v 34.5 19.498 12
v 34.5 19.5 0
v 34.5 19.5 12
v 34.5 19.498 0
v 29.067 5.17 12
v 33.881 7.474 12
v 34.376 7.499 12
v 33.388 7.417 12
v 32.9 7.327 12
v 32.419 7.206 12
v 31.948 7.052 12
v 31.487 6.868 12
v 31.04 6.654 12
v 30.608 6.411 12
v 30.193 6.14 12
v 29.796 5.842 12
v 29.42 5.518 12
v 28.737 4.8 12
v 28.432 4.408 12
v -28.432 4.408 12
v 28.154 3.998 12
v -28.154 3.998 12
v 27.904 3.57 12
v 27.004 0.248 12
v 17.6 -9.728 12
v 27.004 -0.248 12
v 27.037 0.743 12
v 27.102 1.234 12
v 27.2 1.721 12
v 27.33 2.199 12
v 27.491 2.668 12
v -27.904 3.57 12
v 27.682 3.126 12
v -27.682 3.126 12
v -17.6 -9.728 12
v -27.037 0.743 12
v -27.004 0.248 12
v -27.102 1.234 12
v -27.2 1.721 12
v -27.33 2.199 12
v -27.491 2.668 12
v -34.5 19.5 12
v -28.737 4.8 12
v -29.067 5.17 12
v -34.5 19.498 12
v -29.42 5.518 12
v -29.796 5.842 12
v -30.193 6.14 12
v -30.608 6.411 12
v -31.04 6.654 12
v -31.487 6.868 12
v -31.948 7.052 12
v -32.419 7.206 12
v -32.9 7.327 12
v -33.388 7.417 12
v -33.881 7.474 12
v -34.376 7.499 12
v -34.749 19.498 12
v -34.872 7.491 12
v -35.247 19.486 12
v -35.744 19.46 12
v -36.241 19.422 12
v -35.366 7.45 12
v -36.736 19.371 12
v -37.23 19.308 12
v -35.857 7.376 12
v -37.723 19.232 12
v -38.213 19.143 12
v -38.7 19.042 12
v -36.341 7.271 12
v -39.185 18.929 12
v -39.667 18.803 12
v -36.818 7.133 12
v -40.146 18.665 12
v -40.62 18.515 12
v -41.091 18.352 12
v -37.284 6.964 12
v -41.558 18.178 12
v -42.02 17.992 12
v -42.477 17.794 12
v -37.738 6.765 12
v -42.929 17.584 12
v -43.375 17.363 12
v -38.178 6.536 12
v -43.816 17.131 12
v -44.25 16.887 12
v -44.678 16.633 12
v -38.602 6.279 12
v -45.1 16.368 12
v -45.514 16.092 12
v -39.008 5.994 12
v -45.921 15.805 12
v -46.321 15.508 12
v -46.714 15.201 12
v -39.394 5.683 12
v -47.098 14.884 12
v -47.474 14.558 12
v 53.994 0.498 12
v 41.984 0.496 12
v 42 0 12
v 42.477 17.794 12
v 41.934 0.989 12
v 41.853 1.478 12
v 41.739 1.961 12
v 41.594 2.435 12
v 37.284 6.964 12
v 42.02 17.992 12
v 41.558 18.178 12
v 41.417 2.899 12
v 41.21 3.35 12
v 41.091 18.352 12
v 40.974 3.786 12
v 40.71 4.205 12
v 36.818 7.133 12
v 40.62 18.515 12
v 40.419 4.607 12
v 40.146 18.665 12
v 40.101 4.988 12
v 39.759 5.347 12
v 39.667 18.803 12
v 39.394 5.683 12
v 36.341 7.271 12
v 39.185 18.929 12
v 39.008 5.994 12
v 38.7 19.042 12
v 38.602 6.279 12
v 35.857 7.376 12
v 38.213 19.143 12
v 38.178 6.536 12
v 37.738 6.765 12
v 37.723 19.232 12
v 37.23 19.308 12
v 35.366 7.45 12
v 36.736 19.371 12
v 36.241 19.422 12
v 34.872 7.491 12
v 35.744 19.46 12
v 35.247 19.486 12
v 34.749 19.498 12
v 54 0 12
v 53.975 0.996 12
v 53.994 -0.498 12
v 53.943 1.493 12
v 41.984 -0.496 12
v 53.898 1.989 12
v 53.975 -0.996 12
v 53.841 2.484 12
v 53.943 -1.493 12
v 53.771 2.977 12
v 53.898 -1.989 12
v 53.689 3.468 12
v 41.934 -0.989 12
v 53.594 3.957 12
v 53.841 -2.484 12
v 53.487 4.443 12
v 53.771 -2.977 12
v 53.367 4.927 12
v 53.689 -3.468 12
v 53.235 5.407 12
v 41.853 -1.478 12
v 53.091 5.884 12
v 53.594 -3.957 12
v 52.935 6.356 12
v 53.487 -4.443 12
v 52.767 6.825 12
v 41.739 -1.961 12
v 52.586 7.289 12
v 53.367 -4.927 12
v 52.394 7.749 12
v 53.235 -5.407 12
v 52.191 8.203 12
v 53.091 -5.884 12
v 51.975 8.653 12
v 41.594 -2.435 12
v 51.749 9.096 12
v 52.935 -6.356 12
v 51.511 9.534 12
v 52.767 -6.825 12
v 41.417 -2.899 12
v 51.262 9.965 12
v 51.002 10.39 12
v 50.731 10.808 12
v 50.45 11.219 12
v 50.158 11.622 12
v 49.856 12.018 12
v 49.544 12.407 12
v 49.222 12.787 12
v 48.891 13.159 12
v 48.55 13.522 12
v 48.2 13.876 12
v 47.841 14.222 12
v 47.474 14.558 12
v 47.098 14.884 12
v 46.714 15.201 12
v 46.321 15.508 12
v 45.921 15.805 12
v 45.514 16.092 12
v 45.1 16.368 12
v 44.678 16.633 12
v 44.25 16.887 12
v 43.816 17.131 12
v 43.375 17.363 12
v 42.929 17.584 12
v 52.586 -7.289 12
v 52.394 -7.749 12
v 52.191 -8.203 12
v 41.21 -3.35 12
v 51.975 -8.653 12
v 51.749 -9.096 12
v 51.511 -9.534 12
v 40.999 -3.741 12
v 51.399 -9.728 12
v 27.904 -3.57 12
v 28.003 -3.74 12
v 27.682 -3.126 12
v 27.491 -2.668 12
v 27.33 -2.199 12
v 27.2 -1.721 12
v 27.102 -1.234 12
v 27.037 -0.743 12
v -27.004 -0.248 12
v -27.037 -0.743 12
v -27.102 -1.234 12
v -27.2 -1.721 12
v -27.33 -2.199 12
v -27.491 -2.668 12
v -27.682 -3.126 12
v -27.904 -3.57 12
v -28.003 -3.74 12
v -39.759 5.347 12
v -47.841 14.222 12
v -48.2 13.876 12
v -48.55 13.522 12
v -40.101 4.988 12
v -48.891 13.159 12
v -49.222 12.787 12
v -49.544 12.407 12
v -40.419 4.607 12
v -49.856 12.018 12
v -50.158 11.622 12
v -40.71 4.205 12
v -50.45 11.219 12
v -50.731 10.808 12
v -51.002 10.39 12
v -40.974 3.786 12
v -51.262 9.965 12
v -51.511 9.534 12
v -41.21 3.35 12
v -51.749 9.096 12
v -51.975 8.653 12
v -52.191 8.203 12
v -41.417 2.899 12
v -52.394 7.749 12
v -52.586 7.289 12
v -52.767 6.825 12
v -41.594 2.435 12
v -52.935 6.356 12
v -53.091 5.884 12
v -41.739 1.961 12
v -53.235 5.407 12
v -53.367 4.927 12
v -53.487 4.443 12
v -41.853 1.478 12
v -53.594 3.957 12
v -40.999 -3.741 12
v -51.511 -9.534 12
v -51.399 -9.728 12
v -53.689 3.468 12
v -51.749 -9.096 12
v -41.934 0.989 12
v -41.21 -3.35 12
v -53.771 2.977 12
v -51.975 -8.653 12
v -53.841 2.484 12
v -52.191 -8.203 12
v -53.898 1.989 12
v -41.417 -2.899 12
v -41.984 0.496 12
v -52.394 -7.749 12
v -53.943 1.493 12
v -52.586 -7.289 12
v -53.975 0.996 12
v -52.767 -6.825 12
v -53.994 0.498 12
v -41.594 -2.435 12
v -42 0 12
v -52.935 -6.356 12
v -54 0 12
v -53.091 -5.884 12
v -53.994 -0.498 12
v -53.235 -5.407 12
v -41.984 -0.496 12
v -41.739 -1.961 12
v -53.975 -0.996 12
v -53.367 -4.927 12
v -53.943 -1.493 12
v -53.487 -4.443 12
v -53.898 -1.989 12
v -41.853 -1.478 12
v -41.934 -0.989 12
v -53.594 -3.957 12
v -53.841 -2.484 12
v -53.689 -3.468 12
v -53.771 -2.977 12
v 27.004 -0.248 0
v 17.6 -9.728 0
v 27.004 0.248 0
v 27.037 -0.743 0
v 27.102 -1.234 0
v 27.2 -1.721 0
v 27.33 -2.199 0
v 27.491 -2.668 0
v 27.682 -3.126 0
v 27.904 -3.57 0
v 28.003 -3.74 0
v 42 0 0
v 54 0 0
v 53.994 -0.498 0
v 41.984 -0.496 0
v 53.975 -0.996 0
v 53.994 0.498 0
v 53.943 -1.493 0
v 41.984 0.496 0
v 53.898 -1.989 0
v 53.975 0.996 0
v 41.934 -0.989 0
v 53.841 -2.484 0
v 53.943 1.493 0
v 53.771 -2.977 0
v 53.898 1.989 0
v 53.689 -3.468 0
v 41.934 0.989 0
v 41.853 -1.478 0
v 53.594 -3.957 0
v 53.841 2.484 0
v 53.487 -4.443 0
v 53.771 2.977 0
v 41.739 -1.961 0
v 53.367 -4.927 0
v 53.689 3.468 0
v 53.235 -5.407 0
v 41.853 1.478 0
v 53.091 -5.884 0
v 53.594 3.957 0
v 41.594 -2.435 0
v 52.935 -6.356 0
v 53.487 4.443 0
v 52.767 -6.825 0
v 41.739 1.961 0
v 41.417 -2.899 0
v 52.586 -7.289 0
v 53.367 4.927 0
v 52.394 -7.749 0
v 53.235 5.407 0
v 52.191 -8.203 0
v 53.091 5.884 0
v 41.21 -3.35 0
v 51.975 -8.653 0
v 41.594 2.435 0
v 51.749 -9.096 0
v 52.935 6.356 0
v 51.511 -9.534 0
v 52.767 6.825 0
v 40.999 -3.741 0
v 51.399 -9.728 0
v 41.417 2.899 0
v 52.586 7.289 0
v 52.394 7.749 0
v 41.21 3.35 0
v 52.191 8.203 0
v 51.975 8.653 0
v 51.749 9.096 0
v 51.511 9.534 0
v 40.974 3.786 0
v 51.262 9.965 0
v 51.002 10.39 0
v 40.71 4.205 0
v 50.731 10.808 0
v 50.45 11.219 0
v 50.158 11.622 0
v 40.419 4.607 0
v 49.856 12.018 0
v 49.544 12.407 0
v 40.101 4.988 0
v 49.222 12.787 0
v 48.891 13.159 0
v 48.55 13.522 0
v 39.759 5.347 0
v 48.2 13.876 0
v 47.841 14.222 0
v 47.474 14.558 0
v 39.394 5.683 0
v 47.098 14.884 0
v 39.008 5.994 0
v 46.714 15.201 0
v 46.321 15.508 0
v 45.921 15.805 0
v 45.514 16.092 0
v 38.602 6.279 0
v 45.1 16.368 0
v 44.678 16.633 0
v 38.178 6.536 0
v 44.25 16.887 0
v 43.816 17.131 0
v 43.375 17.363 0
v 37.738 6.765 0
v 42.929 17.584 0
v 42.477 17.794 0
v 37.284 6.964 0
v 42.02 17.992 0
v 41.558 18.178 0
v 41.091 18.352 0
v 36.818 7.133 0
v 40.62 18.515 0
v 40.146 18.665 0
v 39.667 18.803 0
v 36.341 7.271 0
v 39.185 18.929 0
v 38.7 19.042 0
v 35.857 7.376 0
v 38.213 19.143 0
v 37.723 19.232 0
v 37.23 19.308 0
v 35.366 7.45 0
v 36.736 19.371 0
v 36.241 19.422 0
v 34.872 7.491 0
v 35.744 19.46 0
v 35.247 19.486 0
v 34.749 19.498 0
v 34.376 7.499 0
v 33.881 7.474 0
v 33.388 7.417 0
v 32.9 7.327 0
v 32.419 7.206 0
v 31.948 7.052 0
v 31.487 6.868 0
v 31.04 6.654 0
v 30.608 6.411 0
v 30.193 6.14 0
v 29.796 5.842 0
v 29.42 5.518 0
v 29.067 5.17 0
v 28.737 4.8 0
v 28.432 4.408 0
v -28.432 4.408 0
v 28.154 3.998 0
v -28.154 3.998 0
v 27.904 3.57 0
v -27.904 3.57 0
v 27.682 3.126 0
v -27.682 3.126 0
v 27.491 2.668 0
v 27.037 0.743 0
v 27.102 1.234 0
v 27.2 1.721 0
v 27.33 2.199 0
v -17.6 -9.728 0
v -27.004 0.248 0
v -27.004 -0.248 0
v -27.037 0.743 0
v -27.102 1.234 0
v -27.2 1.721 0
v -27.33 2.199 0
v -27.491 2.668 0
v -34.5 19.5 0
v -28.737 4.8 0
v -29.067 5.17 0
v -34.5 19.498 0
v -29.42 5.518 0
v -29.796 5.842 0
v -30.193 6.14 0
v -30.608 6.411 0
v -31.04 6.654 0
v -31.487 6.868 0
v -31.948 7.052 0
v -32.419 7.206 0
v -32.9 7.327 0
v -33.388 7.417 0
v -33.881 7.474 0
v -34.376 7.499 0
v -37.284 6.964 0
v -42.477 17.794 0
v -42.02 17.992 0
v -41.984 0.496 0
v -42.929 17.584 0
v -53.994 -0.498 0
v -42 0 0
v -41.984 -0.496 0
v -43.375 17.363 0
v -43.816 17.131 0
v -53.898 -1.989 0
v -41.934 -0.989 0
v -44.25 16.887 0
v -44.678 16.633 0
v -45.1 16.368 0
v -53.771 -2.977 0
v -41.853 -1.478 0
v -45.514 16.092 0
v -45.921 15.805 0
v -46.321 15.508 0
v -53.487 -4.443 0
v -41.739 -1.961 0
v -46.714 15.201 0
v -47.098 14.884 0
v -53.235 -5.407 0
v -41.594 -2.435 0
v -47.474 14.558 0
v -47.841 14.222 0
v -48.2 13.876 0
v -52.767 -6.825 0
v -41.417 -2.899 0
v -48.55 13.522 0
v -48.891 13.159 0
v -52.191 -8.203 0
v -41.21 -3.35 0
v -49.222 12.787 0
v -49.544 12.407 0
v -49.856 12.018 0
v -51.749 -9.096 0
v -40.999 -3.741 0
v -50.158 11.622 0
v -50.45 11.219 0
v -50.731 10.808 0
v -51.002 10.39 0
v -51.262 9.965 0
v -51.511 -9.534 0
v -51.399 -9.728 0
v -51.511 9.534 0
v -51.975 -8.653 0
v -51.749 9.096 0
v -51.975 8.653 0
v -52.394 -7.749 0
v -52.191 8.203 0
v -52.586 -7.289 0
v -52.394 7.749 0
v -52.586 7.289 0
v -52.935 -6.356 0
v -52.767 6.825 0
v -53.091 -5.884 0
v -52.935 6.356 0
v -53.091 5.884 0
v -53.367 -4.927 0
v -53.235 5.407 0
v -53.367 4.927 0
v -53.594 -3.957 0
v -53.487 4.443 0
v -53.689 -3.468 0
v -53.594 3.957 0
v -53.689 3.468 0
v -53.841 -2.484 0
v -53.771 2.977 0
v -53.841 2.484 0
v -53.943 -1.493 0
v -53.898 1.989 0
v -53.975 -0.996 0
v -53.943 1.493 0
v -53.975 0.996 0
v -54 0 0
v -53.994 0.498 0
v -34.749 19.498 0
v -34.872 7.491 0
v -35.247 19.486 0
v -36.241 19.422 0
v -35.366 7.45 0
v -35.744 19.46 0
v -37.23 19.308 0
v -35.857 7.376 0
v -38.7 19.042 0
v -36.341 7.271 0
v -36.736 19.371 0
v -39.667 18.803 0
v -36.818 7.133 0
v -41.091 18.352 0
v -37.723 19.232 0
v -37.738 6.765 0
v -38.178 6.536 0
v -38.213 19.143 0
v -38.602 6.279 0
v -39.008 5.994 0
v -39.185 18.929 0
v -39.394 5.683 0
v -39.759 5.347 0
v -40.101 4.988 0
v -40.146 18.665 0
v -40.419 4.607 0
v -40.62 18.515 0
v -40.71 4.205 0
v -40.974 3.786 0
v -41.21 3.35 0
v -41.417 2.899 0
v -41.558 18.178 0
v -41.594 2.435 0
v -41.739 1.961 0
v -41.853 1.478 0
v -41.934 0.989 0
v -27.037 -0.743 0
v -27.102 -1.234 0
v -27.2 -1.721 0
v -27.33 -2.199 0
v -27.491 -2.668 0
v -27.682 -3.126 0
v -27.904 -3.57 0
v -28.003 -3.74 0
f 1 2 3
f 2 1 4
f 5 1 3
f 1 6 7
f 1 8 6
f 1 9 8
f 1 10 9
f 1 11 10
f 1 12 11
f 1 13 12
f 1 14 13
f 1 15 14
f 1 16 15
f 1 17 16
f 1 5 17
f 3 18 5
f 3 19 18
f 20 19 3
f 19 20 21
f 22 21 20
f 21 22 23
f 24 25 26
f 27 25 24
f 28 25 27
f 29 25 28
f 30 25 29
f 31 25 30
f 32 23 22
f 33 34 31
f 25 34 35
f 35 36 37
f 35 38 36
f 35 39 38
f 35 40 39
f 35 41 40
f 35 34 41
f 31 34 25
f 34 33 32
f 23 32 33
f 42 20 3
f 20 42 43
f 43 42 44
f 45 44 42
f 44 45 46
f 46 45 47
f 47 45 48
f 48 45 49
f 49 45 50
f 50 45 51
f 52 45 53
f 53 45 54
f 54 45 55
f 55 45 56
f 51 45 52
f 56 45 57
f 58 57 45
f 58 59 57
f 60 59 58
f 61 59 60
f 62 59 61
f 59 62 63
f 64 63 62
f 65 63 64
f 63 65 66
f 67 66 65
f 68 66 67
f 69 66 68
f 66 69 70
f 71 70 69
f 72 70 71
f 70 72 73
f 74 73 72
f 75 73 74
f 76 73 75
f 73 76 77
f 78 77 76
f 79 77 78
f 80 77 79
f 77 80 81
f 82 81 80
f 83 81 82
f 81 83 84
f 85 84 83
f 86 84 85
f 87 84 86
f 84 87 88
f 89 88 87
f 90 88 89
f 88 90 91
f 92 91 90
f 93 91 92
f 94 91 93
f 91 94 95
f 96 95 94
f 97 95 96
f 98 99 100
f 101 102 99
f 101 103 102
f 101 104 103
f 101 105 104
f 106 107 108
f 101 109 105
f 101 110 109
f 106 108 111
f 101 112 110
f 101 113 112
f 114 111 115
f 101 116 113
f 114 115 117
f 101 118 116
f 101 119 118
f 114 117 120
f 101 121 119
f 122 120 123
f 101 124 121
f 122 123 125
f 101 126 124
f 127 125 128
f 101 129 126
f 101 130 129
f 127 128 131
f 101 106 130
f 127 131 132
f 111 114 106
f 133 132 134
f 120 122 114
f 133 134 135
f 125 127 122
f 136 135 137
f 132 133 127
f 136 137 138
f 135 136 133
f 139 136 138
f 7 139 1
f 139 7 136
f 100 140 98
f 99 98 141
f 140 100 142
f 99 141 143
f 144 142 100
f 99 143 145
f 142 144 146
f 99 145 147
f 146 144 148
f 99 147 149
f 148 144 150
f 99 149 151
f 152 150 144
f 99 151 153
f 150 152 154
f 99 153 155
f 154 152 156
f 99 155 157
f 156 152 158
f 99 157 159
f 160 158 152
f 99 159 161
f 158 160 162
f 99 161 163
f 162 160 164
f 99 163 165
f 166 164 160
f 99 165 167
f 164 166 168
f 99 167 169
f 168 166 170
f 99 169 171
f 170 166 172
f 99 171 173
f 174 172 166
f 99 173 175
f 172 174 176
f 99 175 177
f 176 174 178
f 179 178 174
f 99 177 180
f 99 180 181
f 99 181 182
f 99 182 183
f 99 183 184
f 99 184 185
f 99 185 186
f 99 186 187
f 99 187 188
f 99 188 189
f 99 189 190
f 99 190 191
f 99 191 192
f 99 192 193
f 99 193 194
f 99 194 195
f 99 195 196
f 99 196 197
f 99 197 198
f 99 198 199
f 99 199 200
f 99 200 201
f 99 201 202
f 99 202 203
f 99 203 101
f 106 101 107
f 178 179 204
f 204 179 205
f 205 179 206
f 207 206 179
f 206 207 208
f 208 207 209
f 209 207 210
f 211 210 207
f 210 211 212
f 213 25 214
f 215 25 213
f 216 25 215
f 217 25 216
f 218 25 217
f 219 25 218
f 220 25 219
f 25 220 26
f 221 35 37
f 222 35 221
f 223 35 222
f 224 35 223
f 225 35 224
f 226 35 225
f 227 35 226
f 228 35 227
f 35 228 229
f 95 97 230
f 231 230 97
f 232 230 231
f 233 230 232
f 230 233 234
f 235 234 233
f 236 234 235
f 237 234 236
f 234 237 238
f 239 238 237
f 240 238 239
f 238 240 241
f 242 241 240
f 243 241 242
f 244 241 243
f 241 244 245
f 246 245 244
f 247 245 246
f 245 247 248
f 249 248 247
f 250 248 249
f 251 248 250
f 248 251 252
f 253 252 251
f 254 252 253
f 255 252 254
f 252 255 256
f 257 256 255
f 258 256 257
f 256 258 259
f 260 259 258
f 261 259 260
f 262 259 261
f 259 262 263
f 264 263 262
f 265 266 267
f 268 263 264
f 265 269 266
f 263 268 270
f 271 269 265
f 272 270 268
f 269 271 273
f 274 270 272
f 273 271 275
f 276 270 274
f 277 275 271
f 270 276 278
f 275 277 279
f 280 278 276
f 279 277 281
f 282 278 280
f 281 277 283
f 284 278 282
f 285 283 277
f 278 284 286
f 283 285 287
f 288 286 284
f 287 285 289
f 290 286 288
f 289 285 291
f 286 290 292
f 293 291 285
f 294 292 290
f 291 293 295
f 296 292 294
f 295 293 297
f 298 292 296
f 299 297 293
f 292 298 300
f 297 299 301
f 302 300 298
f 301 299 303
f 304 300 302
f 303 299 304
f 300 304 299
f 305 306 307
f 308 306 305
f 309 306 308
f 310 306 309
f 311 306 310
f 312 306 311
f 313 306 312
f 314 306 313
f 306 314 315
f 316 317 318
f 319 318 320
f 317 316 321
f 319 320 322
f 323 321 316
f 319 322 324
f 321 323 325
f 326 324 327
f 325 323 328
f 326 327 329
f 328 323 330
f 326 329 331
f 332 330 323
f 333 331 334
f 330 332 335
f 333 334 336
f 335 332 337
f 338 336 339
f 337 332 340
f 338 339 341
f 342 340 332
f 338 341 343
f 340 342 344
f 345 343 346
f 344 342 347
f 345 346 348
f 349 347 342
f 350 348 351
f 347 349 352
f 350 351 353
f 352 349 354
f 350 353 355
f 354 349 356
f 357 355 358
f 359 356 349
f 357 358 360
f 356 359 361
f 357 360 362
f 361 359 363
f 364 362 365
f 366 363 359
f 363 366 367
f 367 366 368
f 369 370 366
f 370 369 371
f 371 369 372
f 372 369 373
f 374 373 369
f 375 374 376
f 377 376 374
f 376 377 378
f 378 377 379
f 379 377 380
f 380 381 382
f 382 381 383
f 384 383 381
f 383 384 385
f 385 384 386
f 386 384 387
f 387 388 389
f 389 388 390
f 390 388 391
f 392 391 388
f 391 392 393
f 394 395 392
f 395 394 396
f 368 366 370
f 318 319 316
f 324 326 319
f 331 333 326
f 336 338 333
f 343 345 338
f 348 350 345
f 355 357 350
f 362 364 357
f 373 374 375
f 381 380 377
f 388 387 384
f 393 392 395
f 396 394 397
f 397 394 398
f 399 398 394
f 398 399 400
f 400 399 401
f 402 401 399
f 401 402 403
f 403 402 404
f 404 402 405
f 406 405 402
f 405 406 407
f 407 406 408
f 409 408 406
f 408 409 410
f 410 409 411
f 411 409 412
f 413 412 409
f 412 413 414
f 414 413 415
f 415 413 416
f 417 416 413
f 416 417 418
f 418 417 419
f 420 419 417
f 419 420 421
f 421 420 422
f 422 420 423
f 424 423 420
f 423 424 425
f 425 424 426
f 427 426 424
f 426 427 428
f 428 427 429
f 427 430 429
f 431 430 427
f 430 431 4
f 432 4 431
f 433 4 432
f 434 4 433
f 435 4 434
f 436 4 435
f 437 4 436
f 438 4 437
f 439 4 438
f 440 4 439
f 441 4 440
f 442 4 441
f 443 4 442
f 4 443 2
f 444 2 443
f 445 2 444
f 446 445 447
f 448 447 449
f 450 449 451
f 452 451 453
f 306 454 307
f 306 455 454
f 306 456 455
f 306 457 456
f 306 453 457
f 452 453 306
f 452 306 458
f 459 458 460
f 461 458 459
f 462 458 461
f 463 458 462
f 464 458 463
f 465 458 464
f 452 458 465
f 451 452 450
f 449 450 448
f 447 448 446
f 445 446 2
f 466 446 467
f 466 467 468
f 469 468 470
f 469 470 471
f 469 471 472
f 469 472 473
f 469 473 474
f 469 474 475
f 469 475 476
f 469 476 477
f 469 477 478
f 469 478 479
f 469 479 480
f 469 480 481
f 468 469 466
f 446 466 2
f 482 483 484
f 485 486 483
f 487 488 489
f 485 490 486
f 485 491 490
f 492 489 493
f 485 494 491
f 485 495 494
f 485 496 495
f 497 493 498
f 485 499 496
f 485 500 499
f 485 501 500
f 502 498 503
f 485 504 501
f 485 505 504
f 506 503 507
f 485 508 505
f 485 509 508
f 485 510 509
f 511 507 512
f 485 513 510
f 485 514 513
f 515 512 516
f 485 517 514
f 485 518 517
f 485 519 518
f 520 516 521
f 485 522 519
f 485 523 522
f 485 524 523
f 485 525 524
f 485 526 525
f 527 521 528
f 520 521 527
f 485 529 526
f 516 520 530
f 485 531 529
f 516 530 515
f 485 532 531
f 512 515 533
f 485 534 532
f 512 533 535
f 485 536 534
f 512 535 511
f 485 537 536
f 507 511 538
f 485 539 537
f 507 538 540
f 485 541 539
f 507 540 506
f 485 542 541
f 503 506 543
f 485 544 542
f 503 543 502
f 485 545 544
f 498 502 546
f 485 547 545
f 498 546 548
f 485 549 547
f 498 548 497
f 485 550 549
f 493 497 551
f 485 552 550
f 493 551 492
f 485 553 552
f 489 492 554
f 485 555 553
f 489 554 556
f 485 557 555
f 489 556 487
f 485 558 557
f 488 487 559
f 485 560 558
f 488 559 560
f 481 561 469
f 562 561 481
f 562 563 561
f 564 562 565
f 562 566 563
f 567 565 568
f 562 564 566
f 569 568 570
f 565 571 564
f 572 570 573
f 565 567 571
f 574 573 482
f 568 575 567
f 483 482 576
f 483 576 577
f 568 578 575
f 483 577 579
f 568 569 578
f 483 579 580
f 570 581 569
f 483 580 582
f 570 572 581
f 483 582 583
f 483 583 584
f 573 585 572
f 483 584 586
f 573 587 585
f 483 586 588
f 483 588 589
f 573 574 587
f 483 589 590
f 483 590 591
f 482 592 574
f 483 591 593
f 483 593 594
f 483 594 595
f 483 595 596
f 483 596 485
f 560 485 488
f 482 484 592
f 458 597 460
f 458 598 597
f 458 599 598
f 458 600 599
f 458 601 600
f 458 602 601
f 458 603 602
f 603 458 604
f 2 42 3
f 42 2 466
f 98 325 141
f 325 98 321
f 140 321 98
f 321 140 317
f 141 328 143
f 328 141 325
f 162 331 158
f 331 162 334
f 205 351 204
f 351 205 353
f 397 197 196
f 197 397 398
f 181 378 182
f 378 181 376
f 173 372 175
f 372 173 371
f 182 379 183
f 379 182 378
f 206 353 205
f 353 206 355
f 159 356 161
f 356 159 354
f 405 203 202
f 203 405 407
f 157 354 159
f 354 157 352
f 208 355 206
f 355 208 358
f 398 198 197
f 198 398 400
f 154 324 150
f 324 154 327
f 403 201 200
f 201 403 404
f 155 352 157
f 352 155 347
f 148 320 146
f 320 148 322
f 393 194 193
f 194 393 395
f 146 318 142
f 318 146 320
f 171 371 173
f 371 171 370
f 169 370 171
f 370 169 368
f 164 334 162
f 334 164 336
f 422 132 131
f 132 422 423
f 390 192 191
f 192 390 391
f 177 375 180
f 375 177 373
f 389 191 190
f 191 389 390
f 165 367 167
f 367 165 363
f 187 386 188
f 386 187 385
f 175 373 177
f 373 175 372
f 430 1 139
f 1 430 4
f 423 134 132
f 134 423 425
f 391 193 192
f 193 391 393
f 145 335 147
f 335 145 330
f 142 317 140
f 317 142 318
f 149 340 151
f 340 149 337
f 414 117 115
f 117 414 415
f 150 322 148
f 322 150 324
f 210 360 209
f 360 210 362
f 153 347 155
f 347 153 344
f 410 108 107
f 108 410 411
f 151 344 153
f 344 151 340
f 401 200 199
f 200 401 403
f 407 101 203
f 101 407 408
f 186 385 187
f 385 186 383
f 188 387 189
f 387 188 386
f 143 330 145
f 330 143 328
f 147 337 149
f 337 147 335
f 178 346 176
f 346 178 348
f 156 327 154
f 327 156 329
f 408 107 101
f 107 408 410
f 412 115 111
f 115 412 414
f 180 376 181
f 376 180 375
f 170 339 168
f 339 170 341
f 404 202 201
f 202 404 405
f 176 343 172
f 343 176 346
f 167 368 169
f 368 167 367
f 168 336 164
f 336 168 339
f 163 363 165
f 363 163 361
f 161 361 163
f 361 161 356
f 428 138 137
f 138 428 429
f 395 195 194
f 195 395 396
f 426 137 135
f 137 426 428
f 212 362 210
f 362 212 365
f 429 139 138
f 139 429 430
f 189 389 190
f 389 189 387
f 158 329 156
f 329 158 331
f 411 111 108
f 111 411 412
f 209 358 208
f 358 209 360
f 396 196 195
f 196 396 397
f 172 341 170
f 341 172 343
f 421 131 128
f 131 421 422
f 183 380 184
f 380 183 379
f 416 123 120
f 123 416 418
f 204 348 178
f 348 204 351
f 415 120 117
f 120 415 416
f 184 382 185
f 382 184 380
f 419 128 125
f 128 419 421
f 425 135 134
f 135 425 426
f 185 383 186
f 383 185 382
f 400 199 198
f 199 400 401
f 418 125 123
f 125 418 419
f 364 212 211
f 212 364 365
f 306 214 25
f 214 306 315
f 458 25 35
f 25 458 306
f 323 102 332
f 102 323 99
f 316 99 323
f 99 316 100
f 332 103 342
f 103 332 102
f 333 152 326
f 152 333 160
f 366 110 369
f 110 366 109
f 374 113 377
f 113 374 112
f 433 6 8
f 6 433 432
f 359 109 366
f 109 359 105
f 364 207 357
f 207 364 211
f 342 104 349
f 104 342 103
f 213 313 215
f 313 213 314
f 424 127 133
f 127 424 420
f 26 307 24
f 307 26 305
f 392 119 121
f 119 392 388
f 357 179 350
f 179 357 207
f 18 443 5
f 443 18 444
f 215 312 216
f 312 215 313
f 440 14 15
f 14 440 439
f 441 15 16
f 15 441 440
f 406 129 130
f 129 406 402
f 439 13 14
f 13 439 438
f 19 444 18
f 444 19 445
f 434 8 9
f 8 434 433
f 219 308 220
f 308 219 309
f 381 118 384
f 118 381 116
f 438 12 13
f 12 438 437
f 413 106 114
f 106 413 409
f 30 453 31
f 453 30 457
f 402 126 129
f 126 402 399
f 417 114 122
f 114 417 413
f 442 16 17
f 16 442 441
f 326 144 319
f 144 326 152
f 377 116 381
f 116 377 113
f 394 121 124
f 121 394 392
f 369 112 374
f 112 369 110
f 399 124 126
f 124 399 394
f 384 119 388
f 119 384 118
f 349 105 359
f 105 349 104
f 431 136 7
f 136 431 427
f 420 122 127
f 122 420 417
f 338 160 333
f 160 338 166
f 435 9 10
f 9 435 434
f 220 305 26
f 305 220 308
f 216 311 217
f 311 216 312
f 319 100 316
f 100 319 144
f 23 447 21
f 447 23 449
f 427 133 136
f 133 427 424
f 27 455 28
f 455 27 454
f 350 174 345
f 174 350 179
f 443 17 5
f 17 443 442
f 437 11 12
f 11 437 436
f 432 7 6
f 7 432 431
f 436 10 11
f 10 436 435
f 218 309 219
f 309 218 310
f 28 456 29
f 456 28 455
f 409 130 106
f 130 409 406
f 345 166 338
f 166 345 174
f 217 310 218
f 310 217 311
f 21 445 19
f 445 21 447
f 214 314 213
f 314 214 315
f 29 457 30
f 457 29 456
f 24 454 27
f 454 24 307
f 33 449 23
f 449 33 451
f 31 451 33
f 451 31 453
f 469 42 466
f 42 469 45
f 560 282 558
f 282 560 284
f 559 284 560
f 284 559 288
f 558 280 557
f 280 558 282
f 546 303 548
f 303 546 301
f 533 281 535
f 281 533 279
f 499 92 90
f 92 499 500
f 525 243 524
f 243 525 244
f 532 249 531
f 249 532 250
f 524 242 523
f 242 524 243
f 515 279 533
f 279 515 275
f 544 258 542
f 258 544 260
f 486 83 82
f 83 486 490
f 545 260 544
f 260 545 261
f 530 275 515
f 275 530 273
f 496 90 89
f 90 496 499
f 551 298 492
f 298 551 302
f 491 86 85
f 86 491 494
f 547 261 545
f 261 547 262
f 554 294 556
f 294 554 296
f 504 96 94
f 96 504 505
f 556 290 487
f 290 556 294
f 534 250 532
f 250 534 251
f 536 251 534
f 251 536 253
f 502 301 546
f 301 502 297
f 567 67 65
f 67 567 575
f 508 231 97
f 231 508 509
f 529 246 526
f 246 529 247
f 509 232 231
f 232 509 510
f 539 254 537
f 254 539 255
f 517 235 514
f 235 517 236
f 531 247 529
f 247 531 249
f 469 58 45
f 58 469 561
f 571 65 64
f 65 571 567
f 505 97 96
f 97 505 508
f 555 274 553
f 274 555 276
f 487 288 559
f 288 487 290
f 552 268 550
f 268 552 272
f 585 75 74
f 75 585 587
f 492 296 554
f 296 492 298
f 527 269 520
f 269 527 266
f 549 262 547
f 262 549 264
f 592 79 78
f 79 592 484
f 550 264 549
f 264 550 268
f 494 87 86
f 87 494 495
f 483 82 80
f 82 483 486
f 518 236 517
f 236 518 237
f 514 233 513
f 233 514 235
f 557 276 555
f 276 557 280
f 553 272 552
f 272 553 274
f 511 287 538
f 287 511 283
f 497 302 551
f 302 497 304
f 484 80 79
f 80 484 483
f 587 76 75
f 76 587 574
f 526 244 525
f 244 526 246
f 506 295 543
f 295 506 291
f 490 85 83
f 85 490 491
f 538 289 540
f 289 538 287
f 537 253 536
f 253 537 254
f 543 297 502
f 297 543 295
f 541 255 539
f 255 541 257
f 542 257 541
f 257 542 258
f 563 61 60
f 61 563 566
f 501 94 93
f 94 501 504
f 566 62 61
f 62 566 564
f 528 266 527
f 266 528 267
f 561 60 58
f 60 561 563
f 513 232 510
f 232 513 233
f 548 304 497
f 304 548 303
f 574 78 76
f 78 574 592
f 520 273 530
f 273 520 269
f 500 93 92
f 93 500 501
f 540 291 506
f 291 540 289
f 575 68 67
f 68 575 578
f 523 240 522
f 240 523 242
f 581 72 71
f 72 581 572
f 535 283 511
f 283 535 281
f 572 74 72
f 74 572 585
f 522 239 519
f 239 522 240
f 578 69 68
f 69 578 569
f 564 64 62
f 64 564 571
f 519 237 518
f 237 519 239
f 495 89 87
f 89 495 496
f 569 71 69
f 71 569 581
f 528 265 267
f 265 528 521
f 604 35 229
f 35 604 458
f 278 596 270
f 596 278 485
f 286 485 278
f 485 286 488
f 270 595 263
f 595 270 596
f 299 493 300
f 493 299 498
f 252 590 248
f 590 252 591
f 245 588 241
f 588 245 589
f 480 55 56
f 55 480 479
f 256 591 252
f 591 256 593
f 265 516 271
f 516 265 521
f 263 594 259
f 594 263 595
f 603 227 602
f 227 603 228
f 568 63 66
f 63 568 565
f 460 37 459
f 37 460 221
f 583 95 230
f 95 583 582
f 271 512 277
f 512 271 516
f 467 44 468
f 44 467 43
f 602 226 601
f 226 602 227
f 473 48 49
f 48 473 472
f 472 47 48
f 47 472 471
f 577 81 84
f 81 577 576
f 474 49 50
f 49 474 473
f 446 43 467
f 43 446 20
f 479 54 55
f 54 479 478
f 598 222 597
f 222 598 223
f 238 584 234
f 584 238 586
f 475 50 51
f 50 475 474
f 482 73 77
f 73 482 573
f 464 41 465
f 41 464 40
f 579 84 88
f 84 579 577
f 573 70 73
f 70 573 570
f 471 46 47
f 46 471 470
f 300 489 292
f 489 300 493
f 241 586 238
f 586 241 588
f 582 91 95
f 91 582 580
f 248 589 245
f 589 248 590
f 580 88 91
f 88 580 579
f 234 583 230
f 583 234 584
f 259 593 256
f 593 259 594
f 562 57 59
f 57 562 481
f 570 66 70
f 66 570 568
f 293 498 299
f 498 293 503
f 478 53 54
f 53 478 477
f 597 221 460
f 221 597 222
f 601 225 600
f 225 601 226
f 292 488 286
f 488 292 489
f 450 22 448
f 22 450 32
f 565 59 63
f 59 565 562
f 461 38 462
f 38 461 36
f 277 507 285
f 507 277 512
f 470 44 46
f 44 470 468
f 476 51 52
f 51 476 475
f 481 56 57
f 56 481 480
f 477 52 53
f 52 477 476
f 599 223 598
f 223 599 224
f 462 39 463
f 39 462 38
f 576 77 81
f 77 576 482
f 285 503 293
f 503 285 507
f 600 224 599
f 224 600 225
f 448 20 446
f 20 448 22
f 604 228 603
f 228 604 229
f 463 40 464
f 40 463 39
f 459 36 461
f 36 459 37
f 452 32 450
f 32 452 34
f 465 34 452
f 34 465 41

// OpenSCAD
//
// Customizable cupboard locking bolt like thingie
// Print lying down for better sturdiness
//
// Copyright 2014 Magnus Kvevlander <magu@me.com>
//
// Creative Commons Attribution-NonCommercial 3.0 Unported (CC BY-NC 3.0)
// http://creativecommons.org/licenses/by-nc/3.0/
//


//
// Base variables
//

// Material thickness in mm. Don't make it too thin.
thk = 12;

// Distance between centers of holes in mm.
hdist = 69;

// Hole diameter in mm.
hdia = 15;

// Width of gap in mm.
gap = 13;


/* [Hidden] */

//
// Rendering magick
//

$fa = 0.01;	// Minimum fragment angle
$fs = 0.5;	// Minimum fragment size
$fn = 0;		// Number of corners in a full circle (shan't be used)

// Hole radius
hrad = hdia / 2;
// Angle of gap cutout
gap_angle = asin ((gap / 2) / hrad);
// Base of cutout triangle
gap_slice_base = (hrad + 1.5 * thk) * tan (gap_angle);
// Offset of compensational cut of bridge part
bridge_cut_offset = (hrad + thk) * sin (90 - gap_angle);

// Render
half_piece ();
mirror ([1,0,0])
	half_piece ();

module half_piece () {
	translate ([0, - hrad - thk, 0])
		difference () {
			// Base shape
			union () {
				// Cuboid
				cube ([hdist / 2, 2 * (hrad + thk), thk]);
				// Rounded edges
				translate ([hdist / 2, hrad + thk, 0])
					cylinder (h = thk, r = hrad + thk);
			}
		
			// Knob hole
			translate ([hdist / 2, hrad + thk, - thk / 2])
				cylinder (h = 2 * thk, r = hrad);

			// Gap
			translate ([0, 0, - thk / 2])
				union () {
					// Triangle
					linear_extrude (height = 2 * thk)
						polygon(points = [[hdist / 2, hrad + thk], [hdist / 2 - gap_slice_base, - thk / 2], [hdist / 2 + gap_slice_base, - thk / 2]]);

					// Bridge cut
						translate ([- thk / 2, - thk / 2, 0])
							cube ([hdist / 2 + thk, hrad + 1.5 * thk - bridge_cut_offset, 2 * thk]);
				}
		}
}
